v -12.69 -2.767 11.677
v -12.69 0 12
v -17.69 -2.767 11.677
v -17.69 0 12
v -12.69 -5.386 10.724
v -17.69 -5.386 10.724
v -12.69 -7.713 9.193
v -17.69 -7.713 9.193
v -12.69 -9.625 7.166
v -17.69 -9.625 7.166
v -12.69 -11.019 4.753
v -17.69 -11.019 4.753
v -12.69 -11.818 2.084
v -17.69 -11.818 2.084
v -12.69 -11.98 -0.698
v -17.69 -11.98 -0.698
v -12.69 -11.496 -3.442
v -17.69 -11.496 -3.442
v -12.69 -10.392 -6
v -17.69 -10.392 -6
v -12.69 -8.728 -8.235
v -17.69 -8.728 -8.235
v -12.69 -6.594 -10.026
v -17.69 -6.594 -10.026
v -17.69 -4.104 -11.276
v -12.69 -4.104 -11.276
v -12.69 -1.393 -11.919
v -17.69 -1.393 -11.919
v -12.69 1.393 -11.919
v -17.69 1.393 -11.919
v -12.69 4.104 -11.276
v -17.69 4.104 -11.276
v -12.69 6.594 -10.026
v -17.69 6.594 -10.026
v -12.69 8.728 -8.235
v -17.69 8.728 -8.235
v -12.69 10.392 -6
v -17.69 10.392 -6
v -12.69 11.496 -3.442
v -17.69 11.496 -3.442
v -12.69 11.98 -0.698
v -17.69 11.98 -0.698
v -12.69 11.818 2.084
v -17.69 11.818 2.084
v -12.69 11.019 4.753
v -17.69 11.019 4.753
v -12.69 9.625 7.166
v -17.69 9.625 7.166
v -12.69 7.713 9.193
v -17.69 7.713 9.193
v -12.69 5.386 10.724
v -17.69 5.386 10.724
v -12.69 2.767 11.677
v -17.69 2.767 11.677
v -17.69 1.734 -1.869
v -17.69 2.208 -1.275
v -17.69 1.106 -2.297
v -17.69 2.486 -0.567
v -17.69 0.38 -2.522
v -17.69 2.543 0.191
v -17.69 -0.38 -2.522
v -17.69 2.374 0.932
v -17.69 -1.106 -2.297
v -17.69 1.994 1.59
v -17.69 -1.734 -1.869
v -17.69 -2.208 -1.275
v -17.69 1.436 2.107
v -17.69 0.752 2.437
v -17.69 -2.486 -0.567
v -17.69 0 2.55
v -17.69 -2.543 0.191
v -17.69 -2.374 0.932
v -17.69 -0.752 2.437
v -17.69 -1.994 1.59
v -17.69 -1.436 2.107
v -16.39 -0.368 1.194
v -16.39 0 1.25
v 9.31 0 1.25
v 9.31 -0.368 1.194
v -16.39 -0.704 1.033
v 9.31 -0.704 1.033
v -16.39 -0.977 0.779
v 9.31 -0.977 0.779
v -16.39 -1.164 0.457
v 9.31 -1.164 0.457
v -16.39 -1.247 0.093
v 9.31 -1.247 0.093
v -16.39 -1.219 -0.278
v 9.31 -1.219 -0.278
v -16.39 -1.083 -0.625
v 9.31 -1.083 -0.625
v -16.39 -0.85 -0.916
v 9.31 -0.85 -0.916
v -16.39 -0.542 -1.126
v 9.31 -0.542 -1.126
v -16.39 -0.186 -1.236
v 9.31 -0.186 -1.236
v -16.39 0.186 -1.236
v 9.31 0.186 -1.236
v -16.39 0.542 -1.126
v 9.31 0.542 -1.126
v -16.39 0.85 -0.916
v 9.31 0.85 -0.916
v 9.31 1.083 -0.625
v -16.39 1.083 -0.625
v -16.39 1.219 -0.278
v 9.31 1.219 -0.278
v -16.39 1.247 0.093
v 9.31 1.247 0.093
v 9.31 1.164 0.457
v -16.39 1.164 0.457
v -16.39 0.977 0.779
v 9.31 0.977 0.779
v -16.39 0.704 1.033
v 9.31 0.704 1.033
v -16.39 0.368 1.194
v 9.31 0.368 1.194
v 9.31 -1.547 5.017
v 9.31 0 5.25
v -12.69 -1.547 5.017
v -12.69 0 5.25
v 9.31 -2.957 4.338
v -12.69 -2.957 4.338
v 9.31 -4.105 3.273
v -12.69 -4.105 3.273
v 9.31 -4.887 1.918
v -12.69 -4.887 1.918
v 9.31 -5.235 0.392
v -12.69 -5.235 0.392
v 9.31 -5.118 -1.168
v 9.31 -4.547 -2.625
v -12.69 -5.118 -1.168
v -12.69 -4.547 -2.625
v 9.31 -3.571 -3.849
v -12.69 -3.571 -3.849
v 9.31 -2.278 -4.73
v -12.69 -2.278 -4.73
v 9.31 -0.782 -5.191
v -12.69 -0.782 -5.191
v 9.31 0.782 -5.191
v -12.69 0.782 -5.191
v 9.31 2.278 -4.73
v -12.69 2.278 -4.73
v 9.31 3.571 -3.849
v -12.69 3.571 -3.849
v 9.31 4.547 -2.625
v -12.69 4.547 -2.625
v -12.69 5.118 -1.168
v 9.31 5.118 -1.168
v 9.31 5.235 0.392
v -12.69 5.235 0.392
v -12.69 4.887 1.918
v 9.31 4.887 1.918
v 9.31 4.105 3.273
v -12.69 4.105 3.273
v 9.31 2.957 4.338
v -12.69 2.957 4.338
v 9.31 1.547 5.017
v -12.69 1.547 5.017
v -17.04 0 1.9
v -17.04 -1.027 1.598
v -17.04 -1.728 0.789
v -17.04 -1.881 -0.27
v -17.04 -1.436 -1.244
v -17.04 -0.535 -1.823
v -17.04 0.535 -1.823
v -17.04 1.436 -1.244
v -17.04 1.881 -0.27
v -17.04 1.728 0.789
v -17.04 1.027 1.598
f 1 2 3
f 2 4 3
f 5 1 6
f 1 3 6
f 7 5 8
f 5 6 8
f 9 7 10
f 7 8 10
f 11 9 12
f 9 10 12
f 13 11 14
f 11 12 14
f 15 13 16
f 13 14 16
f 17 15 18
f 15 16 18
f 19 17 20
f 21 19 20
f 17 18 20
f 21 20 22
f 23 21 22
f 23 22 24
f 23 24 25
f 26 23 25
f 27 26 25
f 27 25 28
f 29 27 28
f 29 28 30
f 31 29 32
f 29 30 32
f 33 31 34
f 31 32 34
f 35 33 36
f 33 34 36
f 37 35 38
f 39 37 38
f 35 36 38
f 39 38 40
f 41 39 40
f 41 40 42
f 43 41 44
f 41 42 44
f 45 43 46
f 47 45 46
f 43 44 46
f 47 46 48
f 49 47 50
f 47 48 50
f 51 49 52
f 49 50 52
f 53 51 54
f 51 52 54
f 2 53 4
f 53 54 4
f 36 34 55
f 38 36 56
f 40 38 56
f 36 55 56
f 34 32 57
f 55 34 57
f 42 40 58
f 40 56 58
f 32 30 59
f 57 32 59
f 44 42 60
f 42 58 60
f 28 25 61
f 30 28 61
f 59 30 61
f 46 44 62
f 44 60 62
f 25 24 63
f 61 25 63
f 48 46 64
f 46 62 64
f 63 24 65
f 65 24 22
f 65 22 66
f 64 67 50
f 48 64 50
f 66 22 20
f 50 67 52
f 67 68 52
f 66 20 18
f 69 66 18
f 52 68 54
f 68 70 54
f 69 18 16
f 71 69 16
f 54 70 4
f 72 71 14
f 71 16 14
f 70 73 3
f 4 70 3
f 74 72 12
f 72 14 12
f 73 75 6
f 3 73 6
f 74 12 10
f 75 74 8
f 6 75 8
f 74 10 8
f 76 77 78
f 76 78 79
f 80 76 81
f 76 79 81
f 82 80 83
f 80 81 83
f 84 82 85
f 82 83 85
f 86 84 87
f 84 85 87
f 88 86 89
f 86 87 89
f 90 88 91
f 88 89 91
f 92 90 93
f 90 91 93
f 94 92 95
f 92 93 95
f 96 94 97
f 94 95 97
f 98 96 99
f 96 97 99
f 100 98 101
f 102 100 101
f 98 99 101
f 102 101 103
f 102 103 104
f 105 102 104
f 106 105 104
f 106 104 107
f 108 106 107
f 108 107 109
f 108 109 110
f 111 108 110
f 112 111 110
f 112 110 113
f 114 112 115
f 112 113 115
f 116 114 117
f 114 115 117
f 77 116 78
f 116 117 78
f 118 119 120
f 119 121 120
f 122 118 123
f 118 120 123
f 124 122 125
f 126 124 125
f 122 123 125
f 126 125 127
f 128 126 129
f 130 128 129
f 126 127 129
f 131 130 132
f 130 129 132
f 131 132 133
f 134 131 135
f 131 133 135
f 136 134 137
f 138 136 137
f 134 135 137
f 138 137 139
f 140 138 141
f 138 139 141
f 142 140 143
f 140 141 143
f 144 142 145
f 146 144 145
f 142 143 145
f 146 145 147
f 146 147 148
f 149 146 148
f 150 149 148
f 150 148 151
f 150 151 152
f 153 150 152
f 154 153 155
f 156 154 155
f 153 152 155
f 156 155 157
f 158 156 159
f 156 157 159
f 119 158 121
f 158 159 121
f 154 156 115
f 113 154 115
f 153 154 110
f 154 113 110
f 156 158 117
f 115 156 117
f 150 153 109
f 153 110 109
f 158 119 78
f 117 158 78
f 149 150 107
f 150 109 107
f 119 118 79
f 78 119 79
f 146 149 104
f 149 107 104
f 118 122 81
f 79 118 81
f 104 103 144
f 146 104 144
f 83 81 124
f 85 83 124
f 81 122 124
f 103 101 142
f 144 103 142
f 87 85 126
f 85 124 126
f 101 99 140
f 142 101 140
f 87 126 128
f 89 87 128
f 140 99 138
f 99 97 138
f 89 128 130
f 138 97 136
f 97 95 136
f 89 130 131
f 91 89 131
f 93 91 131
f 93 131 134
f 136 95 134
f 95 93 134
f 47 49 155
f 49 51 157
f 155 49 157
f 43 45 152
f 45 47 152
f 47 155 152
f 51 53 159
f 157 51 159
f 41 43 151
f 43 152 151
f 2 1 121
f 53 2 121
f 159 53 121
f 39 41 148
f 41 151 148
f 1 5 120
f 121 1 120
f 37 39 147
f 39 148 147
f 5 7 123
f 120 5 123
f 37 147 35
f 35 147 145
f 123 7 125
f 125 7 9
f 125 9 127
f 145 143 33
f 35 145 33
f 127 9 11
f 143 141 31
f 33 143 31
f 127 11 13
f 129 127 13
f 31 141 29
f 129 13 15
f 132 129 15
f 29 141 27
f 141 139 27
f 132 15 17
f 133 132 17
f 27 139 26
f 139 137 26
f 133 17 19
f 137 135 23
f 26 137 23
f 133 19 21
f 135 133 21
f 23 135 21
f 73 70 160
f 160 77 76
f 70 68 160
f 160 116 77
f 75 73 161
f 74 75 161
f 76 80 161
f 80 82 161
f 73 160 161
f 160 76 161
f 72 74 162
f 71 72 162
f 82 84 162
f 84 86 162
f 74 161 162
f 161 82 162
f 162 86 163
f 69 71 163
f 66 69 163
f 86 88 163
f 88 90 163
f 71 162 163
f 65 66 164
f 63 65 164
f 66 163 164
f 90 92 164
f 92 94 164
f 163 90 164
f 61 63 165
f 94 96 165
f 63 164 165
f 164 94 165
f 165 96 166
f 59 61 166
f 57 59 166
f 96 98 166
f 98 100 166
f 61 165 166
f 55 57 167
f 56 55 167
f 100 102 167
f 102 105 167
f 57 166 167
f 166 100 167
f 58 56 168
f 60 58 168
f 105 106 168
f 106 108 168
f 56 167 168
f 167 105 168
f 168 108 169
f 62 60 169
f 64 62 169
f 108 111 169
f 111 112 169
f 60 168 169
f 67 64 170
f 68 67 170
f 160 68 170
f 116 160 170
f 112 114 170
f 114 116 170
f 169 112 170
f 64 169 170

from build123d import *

# Parameters (mm, degrees)
F2_SIZE = 1.3


with BuildPart() as f1:
    # F0 (on Front) → F1 (revolve)
    with BuildSketch(Plane.XZ):
        Polygon((-17.69014, 12), (-17.69014, 1.25), (9.30986, 1.25), (9.30986, 5.25), (-12.69014, 5.25), (-12.69014, 12), align=None)
    revolve(axis=Axis((-2.74572, 0, 0), (1, 0, 0)))

    # F2
    f2_edges = [f1.edges().sort_by_distance(p)[0] for p in [
        (-17.69014, 0, -1.25),
    ]]
    chamfer(f2_edges, length=F2_SIZE)


solid = f1.part
